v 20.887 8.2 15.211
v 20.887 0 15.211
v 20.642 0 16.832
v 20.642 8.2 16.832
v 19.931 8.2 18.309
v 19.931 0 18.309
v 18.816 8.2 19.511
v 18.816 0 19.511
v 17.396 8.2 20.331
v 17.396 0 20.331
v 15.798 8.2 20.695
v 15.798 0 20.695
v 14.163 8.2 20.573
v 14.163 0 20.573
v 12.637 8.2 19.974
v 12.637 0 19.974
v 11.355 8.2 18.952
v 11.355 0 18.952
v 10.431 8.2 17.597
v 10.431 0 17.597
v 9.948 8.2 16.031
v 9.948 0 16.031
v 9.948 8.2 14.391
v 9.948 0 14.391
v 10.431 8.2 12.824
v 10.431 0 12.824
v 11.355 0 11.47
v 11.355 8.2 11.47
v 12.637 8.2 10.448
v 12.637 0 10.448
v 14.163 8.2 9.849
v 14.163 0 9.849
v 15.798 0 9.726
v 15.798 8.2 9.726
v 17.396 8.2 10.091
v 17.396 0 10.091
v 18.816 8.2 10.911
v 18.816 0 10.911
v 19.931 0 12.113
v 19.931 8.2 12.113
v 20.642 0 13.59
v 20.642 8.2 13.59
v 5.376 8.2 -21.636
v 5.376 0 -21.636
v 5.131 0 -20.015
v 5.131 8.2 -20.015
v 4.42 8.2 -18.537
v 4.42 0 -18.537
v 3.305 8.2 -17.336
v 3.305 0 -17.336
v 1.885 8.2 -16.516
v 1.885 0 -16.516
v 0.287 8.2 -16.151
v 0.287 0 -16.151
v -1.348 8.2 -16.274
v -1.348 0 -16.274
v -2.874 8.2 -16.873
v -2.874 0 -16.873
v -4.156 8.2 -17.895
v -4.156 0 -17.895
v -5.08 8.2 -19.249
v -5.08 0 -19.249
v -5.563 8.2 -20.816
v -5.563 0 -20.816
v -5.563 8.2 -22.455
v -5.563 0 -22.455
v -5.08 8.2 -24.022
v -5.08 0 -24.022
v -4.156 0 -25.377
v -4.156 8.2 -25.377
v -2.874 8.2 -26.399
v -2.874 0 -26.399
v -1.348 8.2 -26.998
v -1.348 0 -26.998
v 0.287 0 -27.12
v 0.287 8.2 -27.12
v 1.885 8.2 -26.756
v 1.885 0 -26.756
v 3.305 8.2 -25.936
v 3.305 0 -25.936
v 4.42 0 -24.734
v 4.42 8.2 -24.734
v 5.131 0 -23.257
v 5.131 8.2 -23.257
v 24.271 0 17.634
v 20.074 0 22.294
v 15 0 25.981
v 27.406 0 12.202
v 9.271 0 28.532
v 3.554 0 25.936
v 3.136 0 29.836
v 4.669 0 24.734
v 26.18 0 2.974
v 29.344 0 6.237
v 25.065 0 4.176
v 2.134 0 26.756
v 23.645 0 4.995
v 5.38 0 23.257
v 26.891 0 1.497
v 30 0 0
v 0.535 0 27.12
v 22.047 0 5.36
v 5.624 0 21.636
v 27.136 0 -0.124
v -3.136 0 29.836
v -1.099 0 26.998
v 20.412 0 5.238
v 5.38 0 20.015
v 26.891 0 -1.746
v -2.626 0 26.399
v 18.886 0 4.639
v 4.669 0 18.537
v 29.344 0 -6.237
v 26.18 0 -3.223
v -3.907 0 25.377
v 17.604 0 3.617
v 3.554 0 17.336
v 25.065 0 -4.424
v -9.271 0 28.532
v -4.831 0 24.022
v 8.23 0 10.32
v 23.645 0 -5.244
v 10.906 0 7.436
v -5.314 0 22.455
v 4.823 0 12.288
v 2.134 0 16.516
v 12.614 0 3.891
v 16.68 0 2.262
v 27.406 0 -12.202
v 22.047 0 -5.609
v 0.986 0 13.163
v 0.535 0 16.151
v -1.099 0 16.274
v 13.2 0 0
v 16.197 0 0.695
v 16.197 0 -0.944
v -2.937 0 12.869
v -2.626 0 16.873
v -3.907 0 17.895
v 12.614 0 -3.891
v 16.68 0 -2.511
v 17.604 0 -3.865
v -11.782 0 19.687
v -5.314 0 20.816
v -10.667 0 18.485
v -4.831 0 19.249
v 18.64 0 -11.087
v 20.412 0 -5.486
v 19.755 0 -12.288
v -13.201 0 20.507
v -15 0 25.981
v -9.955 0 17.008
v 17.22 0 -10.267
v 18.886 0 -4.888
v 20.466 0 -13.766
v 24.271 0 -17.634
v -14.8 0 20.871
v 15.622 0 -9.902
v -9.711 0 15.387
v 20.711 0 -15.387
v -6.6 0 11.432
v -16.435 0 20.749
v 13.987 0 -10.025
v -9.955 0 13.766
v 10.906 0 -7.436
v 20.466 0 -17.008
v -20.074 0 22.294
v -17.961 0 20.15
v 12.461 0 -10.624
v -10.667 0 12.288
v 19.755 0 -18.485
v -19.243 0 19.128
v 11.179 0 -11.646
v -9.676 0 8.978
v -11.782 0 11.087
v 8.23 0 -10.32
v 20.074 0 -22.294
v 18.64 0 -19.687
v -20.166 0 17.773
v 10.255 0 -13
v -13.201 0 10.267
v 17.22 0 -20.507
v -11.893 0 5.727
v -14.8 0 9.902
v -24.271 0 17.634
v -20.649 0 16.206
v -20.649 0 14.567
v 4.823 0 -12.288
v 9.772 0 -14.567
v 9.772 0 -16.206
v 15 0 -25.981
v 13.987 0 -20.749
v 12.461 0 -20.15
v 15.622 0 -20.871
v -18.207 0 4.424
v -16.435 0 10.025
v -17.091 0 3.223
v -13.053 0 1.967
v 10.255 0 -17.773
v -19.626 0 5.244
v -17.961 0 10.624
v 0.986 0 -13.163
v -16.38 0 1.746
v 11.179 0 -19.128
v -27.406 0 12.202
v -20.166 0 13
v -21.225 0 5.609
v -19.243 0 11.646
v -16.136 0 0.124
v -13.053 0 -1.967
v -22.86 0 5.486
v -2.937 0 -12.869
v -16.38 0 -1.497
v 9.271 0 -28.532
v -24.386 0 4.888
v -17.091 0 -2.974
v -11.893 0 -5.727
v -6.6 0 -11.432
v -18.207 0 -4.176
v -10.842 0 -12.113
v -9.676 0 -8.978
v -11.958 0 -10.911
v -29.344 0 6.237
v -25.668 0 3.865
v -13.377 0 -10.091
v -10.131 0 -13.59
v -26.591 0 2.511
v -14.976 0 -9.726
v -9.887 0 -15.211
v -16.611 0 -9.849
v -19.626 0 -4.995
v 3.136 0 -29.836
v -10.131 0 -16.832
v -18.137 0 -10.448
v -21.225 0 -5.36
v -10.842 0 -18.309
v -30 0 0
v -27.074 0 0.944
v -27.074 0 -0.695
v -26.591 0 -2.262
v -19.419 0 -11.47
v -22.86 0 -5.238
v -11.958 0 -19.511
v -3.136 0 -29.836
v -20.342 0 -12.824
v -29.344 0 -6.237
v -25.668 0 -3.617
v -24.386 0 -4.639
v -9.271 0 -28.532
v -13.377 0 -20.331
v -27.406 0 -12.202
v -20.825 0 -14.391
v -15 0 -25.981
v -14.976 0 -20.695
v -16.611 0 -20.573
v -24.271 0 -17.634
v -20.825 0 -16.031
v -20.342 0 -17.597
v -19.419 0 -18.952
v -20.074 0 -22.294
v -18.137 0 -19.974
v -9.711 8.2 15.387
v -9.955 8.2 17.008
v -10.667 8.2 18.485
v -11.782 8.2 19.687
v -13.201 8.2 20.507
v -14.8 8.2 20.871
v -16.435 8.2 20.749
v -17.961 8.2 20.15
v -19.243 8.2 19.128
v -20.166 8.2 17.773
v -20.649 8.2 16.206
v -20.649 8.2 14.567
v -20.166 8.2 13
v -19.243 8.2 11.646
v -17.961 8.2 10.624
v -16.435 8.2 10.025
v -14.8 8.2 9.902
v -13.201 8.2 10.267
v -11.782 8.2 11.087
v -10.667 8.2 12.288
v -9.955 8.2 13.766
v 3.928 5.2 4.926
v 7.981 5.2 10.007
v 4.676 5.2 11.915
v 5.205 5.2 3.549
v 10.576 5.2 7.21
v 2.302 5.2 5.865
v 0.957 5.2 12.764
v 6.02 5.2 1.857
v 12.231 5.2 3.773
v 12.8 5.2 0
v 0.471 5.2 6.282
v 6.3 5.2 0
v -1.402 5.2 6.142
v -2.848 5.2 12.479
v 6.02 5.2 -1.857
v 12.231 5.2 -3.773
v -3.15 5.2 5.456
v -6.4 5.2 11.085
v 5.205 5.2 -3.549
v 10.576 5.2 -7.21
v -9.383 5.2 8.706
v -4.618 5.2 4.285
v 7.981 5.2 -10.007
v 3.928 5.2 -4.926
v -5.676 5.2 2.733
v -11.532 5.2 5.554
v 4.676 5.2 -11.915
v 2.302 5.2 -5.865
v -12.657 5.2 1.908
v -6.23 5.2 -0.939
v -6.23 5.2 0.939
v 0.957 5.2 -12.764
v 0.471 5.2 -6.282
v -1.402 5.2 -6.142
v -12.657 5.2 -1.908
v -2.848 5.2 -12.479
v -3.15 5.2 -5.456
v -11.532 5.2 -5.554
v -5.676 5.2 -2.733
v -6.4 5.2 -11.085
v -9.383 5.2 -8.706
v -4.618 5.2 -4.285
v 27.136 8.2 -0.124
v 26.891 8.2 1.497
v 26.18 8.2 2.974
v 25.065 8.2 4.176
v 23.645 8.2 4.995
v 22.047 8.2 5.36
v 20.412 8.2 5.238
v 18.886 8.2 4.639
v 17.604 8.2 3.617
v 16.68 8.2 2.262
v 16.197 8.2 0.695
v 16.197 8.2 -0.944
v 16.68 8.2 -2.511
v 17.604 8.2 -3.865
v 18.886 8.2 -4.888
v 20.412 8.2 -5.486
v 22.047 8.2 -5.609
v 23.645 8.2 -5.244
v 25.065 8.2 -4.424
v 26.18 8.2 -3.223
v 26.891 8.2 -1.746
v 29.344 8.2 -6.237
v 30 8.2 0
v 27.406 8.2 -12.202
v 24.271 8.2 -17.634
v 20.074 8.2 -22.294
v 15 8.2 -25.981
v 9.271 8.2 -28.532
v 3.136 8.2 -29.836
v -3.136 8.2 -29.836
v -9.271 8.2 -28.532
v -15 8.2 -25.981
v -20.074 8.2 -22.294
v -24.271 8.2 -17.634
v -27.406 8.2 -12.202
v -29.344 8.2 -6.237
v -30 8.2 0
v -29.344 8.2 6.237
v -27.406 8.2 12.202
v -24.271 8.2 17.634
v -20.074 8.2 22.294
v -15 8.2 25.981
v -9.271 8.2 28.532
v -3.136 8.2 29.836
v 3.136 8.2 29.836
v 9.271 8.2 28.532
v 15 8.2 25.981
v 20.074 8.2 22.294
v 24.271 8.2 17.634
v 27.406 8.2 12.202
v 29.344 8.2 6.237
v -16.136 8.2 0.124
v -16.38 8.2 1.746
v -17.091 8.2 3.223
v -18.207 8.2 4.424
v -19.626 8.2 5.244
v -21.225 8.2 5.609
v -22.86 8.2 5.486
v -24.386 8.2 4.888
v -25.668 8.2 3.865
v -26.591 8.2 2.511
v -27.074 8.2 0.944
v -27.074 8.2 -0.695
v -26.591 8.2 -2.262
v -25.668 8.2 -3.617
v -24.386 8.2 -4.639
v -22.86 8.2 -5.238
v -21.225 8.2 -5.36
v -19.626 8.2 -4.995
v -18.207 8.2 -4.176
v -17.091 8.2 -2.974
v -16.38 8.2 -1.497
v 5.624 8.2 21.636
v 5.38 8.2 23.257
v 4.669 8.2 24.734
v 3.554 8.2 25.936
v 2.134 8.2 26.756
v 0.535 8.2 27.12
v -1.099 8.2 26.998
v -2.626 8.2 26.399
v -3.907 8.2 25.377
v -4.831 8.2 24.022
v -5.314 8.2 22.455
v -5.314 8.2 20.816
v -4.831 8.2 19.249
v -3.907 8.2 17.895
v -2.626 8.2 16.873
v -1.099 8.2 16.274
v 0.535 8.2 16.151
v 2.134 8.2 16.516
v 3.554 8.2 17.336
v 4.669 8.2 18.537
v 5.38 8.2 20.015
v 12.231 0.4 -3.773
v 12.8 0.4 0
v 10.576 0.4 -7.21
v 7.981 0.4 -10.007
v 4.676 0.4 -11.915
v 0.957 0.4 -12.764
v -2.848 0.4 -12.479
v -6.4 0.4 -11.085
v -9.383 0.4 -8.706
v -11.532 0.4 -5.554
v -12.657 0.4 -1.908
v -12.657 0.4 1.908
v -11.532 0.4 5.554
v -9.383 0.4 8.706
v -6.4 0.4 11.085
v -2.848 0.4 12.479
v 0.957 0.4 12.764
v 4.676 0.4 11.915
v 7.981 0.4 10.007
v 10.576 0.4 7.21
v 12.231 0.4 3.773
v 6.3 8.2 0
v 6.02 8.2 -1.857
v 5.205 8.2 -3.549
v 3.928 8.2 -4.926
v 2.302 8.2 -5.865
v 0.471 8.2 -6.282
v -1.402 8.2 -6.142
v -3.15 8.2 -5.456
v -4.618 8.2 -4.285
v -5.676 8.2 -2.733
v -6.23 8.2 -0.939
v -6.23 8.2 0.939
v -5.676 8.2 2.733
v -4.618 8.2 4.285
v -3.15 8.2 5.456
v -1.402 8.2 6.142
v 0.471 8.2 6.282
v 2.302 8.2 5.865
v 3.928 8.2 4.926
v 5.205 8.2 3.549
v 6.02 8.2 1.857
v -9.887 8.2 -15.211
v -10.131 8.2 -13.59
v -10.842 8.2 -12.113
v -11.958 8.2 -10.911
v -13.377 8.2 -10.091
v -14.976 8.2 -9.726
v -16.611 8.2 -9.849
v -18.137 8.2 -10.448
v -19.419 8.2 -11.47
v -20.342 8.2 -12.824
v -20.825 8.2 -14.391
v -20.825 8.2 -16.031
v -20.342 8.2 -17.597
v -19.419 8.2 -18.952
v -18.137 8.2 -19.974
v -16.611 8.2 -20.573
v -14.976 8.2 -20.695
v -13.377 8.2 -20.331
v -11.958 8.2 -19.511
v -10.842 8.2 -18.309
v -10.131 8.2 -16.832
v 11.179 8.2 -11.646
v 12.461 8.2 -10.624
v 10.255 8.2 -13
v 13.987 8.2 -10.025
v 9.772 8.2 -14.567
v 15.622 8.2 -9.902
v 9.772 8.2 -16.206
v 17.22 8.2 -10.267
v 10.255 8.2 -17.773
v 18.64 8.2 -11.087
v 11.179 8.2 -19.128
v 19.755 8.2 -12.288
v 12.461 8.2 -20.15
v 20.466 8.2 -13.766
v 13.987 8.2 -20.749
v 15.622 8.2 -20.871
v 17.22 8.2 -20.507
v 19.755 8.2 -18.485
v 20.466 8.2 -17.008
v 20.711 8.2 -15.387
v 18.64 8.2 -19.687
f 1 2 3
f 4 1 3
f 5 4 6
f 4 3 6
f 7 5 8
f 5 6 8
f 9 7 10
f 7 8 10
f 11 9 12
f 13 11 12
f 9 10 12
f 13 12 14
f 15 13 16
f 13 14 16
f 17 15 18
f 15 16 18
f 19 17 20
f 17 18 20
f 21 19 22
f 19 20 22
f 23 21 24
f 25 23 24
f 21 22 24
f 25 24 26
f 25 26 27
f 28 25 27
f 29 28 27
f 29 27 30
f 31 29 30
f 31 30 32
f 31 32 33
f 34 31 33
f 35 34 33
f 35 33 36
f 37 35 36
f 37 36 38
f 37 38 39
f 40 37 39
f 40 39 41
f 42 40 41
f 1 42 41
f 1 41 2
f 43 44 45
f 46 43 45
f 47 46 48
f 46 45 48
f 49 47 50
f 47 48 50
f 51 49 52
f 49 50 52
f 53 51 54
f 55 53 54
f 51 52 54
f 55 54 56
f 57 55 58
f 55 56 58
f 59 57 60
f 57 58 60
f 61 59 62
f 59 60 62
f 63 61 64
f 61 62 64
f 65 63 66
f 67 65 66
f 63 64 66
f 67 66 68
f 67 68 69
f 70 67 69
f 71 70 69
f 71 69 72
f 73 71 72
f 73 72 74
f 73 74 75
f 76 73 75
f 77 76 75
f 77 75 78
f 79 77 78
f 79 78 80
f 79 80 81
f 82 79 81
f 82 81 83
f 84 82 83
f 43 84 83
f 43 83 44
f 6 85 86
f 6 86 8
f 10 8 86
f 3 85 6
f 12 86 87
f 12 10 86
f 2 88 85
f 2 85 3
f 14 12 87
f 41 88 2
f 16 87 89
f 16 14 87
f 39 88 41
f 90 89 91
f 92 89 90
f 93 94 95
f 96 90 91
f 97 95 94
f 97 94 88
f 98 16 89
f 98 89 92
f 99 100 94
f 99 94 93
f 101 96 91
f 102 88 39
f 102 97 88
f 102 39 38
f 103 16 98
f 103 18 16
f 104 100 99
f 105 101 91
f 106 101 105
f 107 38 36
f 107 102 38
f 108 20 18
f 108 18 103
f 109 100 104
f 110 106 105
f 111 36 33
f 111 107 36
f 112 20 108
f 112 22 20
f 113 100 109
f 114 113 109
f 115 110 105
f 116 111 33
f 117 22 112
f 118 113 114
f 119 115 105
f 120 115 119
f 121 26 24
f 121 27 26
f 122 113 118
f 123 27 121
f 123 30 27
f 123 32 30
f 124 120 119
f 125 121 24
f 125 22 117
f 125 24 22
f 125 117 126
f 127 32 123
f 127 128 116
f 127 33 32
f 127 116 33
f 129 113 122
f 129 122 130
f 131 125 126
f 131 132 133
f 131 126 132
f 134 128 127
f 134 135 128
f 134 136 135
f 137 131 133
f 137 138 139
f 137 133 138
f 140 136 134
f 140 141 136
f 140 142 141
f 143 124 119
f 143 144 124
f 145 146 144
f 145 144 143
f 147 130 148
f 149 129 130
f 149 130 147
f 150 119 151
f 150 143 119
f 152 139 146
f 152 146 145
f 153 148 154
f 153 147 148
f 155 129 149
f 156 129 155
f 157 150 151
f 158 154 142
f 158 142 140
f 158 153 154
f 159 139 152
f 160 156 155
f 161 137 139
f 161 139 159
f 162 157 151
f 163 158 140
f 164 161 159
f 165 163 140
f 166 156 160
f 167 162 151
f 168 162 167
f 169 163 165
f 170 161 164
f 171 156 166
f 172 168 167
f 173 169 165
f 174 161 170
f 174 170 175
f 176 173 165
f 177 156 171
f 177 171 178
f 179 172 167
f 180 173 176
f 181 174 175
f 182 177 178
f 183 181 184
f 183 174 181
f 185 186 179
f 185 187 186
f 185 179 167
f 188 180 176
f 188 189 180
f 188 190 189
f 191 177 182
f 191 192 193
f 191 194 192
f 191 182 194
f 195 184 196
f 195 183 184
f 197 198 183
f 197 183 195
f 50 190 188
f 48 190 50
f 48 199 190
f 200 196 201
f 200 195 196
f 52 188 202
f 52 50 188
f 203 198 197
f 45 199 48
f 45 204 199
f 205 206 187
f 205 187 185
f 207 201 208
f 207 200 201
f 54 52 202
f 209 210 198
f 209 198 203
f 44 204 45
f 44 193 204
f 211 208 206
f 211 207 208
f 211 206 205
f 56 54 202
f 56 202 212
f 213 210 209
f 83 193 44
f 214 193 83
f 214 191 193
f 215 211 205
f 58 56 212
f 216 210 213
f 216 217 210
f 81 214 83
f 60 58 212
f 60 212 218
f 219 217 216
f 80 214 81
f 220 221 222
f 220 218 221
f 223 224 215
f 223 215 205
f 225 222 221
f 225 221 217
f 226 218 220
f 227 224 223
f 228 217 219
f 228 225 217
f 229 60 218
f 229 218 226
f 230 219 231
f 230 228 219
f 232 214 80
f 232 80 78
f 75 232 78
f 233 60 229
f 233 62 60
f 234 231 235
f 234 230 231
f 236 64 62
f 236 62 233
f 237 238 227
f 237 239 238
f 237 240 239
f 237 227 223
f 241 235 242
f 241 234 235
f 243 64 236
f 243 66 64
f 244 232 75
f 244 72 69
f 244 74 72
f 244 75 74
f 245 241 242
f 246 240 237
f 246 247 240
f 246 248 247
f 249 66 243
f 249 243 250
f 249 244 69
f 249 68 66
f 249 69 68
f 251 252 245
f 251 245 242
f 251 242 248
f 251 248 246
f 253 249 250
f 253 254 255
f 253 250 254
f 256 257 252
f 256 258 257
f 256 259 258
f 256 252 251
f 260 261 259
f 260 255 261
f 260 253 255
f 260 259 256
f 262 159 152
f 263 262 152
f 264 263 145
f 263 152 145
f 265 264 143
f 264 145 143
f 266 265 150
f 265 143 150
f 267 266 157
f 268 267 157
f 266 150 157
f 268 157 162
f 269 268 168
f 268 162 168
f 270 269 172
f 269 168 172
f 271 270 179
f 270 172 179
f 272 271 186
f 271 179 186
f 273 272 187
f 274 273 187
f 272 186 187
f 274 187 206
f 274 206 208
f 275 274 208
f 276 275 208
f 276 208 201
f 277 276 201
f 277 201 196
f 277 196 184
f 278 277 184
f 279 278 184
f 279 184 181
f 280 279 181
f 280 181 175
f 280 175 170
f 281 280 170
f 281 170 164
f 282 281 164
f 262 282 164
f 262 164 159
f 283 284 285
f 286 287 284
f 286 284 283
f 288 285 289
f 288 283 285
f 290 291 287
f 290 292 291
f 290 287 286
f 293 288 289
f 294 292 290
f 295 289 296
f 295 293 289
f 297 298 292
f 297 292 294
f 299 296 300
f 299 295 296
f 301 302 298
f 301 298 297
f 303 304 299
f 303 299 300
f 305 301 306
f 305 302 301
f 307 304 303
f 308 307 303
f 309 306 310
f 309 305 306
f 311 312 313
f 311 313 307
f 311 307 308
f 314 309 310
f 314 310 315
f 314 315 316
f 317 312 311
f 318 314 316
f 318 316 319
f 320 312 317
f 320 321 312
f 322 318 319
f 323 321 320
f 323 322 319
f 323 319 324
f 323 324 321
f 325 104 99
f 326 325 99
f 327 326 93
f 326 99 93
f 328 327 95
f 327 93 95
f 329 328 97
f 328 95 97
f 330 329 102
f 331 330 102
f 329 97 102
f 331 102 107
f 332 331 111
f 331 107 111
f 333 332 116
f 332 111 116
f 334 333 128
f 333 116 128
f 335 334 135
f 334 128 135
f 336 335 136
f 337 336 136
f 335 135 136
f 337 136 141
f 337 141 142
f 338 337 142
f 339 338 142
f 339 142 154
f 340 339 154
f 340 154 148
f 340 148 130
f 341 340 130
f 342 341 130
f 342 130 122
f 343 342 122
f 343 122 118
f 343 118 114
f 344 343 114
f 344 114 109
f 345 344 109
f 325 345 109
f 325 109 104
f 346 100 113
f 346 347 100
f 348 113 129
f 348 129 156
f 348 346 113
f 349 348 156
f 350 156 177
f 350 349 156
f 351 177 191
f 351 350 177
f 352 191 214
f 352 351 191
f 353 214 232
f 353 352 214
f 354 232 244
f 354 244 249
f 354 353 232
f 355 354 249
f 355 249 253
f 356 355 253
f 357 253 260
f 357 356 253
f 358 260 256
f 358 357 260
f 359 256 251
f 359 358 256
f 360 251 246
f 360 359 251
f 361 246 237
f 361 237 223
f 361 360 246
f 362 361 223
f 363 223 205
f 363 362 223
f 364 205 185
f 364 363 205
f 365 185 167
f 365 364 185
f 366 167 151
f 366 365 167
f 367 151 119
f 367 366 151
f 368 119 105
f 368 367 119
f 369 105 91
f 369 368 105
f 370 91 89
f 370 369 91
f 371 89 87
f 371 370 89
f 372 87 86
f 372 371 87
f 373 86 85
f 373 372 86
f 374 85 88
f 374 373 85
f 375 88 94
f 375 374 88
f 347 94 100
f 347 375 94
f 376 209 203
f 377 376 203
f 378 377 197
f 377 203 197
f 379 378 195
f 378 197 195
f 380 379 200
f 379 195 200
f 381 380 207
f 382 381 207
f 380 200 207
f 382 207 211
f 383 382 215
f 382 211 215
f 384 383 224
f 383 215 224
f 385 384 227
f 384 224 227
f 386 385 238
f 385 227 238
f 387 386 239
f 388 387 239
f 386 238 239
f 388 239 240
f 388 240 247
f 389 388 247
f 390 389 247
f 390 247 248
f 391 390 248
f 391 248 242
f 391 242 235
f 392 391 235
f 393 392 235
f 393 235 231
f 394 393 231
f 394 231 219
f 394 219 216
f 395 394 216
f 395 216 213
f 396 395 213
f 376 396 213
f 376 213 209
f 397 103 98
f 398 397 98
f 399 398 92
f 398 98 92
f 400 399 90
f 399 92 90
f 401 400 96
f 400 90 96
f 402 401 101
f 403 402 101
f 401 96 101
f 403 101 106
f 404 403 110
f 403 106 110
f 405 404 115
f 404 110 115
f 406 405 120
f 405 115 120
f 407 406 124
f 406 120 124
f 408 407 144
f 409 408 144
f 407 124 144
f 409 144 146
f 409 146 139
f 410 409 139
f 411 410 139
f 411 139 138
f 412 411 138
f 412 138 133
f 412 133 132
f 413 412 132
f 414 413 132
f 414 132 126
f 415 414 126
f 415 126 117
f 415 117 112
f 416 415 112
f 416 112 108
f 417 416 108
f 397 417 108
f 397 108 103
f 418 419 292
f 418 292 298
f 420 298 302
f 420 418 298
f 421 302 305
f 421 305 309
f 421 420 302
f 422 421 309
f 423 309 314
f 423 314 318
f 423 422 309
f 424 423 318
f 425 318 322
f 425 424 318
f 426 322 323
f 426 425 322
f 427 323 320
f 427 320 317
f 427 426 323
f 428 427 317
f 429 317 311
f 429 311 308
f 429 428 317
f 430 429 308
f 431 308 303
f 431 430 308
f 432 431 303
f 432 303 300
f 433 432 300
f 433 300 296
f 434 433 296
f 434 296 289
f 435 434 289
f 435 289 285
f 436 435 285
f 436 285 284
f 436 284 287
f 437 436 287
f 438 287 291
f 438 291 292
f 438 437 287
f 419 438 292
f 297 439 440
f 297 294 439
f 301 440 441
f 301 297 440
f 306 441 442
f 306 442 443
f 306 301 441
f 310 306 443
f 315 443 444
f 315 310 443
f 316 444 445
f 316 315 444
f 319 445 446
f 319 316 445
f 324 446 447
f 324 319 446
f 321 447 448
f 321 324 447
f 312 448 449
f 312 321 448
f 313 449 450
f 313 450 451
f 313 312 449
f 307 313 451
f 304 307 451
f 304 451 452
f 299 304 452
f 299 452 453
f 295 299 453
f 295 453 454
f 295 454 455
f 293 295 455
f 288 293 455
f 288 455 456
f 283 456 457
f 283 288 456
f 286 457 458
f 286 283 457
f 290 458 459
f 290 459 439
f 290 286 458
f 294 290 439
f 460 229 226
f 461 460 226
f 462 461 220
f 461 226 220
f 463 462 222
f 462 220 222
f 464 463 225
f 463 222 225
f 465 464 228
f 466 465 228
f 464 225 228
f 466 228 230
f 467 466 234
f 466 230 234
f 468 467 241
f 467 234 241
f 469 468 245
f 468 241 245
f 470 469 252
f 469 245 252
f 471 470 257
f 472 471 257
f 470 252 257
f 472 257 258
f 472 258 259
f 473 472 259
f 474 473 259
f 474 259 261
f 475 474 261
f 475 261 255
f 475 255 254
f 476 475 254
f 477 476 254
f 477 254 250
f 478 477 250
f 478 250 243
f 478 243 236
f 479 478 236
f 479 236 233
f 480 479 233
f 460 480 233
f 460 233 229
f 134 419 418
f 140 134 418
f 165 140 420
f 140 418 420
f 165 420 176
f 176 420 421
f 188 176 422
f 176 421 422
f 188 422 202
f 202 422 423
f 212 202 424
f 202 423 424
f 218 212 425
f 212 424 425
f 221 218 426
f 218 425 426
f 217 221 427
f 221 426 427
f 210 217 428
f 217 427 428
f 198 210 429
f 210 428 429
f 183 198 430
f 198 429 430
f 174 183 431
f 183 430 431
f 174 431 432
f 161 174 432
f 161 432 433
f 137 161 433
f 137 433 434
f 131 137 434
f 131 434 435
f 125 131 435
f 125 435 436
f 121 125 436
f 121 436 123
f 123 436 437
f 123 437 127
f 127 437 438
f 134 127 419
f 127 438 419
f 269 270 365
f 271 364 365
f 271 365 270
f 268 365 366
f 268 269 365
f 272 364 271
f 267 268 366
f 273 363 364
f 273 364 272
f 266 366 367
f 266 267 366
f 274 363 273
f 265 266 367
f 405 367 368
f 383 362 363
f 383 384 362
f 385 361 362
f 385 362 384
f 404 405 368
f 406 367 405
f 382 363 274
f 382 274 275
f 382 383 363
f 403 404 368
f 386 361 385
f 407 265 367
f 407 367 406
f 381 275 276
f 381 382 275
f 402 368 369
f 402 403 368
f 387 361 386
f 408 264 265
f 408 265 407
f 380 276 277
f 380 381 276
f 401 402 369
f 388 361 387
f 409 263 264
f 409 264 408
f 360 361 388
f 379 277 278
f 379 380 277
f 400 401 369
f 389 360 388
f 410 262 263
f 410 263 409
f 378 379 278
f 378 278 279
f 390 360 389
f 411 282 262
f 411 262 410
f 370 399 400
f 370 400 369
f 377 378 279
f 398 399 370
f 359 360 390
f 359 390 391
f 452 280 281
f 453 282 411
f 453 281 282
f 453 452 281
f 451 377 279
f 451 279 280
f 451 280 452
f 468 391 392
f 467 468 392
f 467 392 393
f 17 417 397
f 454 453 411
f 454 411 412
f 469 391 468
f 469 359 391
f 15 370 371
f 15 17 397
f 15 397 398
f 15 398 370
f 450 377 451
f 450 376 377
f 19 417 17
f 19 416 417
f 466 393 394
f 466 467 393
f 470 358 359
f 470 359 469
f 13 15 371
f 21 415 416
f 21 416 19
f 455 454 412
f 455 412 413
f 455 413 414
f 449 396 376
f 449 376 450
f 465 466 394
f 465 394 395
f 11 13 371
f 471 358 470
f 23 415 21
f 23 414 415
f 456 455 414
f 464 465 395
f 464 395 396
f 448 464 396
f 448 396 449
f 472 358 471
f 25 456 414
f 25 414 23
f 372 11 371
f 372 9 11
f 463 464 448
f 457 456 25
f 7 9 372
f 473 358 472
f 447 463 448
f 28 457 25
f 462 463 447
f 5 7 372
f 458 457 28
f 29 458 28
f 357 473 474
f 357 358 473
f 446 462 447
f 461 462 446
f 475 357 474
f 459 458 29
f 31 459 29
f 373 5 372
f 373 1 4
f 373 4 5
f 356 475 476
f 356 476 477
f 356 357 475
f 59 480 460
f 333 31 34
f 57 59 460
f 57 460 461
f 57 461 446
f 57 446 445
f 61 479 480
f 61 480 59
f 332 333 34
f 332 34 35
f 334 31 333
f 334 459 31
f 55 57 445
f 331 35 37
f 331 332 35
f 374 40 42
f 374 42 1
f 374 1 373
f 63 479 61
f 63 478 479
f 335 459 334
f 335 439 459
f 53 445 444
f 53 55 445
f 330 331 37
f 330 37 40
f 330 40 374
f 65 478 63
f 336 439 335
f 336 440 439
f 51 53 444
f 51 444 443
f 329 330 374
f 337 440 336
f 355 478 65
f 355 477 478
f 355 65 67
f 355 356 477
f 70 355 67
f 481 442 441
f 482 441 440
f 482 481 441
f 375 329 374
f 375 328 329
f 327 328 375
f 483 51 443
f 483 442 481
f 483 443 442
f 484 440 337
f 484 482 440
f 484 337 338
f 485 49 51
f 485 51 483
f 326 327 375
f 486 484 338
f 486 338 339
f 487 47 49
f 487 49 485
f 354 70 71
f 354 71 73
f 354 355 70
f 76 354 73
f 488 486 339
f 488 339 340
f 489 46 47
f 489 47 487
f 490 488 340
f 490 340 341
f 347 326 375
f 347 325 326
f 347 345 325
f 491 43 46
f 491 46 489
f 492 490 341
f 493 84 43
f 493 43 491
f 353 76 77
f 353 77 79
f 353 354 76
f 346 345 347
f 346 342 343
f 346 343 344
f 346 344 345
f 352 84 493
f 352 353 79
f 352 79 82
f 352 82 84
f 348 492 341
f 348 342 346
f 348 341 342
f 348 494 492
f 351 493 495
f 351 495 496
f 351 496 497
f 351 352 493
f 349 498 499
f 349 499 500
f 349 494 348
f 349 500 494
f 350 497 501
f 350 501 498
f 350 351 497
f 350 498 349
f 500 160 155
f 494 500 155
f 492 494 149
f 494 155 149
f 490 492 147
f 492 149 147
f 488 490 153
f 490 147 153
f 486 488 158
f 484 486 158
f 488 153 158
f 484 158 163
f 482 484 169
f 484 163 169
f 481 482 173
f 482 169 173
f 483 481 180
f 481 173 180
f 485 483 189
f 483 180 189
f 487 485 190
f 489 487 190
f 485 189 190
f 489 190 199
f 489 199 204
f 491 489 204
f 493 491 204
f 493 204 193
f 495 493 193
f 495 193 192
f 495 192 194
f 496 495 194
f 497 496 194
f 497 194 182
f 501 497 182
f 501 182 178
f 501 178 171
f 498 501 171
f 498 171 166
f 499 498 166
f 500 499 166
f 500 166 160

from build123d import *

# Parameters (mm, degrees)
SKETCH001_R  = 5.5
POCKET_DEPTH = 8.201
CHAMFER_SIZE = 0.4


with BuildPart() as part:
    # Sketch → Revolution (revolve)
    with BuildSketch(Plane.XY):
        Polygon((30, 0), (30, 8.2), (6.3, 8.2), (6.3, 5.2), (12.8, 5.2), (12.8, 0), align=None)
    revolve(axis=Axis((0, 0, 0), (0, 1, 0)))

    # Sketch001 (on Face6 of Revolution) → Pocket (cut, through all)
    with BuildSketch(Plane.XZ):
        with Locations((0.124373, 21.635731)):
            Circle(SKETCH001_R)
        with Locations((15.386717, 15.210827)):
            Circle(SKETCH001_R)
        with Locations((21.635731, -0.124373)):
            Circle(SKETCH001_R)
        with Locations((15.210827, -15.386717)):
            Circle(SKETCH001_R)
        with Locations((-0.124373, -21.635731)):
            Circle(SKETCH001_R)
        with Locations((-15.386717, -15.210827)):
            Circle(SKETCH001_R)
        with Locations((-21.635731, 0.124373)):
            Circle(SKETCH001_R)
        with Locations((-15.210827, 15.386717)):
            Circle(SKETCH001_R)
    extrude(amount=-POCKET_DEPTH, mode=Mode.SUBTRACT)

    # Chamfer
    chamfer_edges = [part.edges().sort_by_distance(p)[0] for p in [
        (-12.8, 0, 0),
    ]]
    chamfer(chamfer_edges, length=CHAMFER_SIZE)


solid = part.part
